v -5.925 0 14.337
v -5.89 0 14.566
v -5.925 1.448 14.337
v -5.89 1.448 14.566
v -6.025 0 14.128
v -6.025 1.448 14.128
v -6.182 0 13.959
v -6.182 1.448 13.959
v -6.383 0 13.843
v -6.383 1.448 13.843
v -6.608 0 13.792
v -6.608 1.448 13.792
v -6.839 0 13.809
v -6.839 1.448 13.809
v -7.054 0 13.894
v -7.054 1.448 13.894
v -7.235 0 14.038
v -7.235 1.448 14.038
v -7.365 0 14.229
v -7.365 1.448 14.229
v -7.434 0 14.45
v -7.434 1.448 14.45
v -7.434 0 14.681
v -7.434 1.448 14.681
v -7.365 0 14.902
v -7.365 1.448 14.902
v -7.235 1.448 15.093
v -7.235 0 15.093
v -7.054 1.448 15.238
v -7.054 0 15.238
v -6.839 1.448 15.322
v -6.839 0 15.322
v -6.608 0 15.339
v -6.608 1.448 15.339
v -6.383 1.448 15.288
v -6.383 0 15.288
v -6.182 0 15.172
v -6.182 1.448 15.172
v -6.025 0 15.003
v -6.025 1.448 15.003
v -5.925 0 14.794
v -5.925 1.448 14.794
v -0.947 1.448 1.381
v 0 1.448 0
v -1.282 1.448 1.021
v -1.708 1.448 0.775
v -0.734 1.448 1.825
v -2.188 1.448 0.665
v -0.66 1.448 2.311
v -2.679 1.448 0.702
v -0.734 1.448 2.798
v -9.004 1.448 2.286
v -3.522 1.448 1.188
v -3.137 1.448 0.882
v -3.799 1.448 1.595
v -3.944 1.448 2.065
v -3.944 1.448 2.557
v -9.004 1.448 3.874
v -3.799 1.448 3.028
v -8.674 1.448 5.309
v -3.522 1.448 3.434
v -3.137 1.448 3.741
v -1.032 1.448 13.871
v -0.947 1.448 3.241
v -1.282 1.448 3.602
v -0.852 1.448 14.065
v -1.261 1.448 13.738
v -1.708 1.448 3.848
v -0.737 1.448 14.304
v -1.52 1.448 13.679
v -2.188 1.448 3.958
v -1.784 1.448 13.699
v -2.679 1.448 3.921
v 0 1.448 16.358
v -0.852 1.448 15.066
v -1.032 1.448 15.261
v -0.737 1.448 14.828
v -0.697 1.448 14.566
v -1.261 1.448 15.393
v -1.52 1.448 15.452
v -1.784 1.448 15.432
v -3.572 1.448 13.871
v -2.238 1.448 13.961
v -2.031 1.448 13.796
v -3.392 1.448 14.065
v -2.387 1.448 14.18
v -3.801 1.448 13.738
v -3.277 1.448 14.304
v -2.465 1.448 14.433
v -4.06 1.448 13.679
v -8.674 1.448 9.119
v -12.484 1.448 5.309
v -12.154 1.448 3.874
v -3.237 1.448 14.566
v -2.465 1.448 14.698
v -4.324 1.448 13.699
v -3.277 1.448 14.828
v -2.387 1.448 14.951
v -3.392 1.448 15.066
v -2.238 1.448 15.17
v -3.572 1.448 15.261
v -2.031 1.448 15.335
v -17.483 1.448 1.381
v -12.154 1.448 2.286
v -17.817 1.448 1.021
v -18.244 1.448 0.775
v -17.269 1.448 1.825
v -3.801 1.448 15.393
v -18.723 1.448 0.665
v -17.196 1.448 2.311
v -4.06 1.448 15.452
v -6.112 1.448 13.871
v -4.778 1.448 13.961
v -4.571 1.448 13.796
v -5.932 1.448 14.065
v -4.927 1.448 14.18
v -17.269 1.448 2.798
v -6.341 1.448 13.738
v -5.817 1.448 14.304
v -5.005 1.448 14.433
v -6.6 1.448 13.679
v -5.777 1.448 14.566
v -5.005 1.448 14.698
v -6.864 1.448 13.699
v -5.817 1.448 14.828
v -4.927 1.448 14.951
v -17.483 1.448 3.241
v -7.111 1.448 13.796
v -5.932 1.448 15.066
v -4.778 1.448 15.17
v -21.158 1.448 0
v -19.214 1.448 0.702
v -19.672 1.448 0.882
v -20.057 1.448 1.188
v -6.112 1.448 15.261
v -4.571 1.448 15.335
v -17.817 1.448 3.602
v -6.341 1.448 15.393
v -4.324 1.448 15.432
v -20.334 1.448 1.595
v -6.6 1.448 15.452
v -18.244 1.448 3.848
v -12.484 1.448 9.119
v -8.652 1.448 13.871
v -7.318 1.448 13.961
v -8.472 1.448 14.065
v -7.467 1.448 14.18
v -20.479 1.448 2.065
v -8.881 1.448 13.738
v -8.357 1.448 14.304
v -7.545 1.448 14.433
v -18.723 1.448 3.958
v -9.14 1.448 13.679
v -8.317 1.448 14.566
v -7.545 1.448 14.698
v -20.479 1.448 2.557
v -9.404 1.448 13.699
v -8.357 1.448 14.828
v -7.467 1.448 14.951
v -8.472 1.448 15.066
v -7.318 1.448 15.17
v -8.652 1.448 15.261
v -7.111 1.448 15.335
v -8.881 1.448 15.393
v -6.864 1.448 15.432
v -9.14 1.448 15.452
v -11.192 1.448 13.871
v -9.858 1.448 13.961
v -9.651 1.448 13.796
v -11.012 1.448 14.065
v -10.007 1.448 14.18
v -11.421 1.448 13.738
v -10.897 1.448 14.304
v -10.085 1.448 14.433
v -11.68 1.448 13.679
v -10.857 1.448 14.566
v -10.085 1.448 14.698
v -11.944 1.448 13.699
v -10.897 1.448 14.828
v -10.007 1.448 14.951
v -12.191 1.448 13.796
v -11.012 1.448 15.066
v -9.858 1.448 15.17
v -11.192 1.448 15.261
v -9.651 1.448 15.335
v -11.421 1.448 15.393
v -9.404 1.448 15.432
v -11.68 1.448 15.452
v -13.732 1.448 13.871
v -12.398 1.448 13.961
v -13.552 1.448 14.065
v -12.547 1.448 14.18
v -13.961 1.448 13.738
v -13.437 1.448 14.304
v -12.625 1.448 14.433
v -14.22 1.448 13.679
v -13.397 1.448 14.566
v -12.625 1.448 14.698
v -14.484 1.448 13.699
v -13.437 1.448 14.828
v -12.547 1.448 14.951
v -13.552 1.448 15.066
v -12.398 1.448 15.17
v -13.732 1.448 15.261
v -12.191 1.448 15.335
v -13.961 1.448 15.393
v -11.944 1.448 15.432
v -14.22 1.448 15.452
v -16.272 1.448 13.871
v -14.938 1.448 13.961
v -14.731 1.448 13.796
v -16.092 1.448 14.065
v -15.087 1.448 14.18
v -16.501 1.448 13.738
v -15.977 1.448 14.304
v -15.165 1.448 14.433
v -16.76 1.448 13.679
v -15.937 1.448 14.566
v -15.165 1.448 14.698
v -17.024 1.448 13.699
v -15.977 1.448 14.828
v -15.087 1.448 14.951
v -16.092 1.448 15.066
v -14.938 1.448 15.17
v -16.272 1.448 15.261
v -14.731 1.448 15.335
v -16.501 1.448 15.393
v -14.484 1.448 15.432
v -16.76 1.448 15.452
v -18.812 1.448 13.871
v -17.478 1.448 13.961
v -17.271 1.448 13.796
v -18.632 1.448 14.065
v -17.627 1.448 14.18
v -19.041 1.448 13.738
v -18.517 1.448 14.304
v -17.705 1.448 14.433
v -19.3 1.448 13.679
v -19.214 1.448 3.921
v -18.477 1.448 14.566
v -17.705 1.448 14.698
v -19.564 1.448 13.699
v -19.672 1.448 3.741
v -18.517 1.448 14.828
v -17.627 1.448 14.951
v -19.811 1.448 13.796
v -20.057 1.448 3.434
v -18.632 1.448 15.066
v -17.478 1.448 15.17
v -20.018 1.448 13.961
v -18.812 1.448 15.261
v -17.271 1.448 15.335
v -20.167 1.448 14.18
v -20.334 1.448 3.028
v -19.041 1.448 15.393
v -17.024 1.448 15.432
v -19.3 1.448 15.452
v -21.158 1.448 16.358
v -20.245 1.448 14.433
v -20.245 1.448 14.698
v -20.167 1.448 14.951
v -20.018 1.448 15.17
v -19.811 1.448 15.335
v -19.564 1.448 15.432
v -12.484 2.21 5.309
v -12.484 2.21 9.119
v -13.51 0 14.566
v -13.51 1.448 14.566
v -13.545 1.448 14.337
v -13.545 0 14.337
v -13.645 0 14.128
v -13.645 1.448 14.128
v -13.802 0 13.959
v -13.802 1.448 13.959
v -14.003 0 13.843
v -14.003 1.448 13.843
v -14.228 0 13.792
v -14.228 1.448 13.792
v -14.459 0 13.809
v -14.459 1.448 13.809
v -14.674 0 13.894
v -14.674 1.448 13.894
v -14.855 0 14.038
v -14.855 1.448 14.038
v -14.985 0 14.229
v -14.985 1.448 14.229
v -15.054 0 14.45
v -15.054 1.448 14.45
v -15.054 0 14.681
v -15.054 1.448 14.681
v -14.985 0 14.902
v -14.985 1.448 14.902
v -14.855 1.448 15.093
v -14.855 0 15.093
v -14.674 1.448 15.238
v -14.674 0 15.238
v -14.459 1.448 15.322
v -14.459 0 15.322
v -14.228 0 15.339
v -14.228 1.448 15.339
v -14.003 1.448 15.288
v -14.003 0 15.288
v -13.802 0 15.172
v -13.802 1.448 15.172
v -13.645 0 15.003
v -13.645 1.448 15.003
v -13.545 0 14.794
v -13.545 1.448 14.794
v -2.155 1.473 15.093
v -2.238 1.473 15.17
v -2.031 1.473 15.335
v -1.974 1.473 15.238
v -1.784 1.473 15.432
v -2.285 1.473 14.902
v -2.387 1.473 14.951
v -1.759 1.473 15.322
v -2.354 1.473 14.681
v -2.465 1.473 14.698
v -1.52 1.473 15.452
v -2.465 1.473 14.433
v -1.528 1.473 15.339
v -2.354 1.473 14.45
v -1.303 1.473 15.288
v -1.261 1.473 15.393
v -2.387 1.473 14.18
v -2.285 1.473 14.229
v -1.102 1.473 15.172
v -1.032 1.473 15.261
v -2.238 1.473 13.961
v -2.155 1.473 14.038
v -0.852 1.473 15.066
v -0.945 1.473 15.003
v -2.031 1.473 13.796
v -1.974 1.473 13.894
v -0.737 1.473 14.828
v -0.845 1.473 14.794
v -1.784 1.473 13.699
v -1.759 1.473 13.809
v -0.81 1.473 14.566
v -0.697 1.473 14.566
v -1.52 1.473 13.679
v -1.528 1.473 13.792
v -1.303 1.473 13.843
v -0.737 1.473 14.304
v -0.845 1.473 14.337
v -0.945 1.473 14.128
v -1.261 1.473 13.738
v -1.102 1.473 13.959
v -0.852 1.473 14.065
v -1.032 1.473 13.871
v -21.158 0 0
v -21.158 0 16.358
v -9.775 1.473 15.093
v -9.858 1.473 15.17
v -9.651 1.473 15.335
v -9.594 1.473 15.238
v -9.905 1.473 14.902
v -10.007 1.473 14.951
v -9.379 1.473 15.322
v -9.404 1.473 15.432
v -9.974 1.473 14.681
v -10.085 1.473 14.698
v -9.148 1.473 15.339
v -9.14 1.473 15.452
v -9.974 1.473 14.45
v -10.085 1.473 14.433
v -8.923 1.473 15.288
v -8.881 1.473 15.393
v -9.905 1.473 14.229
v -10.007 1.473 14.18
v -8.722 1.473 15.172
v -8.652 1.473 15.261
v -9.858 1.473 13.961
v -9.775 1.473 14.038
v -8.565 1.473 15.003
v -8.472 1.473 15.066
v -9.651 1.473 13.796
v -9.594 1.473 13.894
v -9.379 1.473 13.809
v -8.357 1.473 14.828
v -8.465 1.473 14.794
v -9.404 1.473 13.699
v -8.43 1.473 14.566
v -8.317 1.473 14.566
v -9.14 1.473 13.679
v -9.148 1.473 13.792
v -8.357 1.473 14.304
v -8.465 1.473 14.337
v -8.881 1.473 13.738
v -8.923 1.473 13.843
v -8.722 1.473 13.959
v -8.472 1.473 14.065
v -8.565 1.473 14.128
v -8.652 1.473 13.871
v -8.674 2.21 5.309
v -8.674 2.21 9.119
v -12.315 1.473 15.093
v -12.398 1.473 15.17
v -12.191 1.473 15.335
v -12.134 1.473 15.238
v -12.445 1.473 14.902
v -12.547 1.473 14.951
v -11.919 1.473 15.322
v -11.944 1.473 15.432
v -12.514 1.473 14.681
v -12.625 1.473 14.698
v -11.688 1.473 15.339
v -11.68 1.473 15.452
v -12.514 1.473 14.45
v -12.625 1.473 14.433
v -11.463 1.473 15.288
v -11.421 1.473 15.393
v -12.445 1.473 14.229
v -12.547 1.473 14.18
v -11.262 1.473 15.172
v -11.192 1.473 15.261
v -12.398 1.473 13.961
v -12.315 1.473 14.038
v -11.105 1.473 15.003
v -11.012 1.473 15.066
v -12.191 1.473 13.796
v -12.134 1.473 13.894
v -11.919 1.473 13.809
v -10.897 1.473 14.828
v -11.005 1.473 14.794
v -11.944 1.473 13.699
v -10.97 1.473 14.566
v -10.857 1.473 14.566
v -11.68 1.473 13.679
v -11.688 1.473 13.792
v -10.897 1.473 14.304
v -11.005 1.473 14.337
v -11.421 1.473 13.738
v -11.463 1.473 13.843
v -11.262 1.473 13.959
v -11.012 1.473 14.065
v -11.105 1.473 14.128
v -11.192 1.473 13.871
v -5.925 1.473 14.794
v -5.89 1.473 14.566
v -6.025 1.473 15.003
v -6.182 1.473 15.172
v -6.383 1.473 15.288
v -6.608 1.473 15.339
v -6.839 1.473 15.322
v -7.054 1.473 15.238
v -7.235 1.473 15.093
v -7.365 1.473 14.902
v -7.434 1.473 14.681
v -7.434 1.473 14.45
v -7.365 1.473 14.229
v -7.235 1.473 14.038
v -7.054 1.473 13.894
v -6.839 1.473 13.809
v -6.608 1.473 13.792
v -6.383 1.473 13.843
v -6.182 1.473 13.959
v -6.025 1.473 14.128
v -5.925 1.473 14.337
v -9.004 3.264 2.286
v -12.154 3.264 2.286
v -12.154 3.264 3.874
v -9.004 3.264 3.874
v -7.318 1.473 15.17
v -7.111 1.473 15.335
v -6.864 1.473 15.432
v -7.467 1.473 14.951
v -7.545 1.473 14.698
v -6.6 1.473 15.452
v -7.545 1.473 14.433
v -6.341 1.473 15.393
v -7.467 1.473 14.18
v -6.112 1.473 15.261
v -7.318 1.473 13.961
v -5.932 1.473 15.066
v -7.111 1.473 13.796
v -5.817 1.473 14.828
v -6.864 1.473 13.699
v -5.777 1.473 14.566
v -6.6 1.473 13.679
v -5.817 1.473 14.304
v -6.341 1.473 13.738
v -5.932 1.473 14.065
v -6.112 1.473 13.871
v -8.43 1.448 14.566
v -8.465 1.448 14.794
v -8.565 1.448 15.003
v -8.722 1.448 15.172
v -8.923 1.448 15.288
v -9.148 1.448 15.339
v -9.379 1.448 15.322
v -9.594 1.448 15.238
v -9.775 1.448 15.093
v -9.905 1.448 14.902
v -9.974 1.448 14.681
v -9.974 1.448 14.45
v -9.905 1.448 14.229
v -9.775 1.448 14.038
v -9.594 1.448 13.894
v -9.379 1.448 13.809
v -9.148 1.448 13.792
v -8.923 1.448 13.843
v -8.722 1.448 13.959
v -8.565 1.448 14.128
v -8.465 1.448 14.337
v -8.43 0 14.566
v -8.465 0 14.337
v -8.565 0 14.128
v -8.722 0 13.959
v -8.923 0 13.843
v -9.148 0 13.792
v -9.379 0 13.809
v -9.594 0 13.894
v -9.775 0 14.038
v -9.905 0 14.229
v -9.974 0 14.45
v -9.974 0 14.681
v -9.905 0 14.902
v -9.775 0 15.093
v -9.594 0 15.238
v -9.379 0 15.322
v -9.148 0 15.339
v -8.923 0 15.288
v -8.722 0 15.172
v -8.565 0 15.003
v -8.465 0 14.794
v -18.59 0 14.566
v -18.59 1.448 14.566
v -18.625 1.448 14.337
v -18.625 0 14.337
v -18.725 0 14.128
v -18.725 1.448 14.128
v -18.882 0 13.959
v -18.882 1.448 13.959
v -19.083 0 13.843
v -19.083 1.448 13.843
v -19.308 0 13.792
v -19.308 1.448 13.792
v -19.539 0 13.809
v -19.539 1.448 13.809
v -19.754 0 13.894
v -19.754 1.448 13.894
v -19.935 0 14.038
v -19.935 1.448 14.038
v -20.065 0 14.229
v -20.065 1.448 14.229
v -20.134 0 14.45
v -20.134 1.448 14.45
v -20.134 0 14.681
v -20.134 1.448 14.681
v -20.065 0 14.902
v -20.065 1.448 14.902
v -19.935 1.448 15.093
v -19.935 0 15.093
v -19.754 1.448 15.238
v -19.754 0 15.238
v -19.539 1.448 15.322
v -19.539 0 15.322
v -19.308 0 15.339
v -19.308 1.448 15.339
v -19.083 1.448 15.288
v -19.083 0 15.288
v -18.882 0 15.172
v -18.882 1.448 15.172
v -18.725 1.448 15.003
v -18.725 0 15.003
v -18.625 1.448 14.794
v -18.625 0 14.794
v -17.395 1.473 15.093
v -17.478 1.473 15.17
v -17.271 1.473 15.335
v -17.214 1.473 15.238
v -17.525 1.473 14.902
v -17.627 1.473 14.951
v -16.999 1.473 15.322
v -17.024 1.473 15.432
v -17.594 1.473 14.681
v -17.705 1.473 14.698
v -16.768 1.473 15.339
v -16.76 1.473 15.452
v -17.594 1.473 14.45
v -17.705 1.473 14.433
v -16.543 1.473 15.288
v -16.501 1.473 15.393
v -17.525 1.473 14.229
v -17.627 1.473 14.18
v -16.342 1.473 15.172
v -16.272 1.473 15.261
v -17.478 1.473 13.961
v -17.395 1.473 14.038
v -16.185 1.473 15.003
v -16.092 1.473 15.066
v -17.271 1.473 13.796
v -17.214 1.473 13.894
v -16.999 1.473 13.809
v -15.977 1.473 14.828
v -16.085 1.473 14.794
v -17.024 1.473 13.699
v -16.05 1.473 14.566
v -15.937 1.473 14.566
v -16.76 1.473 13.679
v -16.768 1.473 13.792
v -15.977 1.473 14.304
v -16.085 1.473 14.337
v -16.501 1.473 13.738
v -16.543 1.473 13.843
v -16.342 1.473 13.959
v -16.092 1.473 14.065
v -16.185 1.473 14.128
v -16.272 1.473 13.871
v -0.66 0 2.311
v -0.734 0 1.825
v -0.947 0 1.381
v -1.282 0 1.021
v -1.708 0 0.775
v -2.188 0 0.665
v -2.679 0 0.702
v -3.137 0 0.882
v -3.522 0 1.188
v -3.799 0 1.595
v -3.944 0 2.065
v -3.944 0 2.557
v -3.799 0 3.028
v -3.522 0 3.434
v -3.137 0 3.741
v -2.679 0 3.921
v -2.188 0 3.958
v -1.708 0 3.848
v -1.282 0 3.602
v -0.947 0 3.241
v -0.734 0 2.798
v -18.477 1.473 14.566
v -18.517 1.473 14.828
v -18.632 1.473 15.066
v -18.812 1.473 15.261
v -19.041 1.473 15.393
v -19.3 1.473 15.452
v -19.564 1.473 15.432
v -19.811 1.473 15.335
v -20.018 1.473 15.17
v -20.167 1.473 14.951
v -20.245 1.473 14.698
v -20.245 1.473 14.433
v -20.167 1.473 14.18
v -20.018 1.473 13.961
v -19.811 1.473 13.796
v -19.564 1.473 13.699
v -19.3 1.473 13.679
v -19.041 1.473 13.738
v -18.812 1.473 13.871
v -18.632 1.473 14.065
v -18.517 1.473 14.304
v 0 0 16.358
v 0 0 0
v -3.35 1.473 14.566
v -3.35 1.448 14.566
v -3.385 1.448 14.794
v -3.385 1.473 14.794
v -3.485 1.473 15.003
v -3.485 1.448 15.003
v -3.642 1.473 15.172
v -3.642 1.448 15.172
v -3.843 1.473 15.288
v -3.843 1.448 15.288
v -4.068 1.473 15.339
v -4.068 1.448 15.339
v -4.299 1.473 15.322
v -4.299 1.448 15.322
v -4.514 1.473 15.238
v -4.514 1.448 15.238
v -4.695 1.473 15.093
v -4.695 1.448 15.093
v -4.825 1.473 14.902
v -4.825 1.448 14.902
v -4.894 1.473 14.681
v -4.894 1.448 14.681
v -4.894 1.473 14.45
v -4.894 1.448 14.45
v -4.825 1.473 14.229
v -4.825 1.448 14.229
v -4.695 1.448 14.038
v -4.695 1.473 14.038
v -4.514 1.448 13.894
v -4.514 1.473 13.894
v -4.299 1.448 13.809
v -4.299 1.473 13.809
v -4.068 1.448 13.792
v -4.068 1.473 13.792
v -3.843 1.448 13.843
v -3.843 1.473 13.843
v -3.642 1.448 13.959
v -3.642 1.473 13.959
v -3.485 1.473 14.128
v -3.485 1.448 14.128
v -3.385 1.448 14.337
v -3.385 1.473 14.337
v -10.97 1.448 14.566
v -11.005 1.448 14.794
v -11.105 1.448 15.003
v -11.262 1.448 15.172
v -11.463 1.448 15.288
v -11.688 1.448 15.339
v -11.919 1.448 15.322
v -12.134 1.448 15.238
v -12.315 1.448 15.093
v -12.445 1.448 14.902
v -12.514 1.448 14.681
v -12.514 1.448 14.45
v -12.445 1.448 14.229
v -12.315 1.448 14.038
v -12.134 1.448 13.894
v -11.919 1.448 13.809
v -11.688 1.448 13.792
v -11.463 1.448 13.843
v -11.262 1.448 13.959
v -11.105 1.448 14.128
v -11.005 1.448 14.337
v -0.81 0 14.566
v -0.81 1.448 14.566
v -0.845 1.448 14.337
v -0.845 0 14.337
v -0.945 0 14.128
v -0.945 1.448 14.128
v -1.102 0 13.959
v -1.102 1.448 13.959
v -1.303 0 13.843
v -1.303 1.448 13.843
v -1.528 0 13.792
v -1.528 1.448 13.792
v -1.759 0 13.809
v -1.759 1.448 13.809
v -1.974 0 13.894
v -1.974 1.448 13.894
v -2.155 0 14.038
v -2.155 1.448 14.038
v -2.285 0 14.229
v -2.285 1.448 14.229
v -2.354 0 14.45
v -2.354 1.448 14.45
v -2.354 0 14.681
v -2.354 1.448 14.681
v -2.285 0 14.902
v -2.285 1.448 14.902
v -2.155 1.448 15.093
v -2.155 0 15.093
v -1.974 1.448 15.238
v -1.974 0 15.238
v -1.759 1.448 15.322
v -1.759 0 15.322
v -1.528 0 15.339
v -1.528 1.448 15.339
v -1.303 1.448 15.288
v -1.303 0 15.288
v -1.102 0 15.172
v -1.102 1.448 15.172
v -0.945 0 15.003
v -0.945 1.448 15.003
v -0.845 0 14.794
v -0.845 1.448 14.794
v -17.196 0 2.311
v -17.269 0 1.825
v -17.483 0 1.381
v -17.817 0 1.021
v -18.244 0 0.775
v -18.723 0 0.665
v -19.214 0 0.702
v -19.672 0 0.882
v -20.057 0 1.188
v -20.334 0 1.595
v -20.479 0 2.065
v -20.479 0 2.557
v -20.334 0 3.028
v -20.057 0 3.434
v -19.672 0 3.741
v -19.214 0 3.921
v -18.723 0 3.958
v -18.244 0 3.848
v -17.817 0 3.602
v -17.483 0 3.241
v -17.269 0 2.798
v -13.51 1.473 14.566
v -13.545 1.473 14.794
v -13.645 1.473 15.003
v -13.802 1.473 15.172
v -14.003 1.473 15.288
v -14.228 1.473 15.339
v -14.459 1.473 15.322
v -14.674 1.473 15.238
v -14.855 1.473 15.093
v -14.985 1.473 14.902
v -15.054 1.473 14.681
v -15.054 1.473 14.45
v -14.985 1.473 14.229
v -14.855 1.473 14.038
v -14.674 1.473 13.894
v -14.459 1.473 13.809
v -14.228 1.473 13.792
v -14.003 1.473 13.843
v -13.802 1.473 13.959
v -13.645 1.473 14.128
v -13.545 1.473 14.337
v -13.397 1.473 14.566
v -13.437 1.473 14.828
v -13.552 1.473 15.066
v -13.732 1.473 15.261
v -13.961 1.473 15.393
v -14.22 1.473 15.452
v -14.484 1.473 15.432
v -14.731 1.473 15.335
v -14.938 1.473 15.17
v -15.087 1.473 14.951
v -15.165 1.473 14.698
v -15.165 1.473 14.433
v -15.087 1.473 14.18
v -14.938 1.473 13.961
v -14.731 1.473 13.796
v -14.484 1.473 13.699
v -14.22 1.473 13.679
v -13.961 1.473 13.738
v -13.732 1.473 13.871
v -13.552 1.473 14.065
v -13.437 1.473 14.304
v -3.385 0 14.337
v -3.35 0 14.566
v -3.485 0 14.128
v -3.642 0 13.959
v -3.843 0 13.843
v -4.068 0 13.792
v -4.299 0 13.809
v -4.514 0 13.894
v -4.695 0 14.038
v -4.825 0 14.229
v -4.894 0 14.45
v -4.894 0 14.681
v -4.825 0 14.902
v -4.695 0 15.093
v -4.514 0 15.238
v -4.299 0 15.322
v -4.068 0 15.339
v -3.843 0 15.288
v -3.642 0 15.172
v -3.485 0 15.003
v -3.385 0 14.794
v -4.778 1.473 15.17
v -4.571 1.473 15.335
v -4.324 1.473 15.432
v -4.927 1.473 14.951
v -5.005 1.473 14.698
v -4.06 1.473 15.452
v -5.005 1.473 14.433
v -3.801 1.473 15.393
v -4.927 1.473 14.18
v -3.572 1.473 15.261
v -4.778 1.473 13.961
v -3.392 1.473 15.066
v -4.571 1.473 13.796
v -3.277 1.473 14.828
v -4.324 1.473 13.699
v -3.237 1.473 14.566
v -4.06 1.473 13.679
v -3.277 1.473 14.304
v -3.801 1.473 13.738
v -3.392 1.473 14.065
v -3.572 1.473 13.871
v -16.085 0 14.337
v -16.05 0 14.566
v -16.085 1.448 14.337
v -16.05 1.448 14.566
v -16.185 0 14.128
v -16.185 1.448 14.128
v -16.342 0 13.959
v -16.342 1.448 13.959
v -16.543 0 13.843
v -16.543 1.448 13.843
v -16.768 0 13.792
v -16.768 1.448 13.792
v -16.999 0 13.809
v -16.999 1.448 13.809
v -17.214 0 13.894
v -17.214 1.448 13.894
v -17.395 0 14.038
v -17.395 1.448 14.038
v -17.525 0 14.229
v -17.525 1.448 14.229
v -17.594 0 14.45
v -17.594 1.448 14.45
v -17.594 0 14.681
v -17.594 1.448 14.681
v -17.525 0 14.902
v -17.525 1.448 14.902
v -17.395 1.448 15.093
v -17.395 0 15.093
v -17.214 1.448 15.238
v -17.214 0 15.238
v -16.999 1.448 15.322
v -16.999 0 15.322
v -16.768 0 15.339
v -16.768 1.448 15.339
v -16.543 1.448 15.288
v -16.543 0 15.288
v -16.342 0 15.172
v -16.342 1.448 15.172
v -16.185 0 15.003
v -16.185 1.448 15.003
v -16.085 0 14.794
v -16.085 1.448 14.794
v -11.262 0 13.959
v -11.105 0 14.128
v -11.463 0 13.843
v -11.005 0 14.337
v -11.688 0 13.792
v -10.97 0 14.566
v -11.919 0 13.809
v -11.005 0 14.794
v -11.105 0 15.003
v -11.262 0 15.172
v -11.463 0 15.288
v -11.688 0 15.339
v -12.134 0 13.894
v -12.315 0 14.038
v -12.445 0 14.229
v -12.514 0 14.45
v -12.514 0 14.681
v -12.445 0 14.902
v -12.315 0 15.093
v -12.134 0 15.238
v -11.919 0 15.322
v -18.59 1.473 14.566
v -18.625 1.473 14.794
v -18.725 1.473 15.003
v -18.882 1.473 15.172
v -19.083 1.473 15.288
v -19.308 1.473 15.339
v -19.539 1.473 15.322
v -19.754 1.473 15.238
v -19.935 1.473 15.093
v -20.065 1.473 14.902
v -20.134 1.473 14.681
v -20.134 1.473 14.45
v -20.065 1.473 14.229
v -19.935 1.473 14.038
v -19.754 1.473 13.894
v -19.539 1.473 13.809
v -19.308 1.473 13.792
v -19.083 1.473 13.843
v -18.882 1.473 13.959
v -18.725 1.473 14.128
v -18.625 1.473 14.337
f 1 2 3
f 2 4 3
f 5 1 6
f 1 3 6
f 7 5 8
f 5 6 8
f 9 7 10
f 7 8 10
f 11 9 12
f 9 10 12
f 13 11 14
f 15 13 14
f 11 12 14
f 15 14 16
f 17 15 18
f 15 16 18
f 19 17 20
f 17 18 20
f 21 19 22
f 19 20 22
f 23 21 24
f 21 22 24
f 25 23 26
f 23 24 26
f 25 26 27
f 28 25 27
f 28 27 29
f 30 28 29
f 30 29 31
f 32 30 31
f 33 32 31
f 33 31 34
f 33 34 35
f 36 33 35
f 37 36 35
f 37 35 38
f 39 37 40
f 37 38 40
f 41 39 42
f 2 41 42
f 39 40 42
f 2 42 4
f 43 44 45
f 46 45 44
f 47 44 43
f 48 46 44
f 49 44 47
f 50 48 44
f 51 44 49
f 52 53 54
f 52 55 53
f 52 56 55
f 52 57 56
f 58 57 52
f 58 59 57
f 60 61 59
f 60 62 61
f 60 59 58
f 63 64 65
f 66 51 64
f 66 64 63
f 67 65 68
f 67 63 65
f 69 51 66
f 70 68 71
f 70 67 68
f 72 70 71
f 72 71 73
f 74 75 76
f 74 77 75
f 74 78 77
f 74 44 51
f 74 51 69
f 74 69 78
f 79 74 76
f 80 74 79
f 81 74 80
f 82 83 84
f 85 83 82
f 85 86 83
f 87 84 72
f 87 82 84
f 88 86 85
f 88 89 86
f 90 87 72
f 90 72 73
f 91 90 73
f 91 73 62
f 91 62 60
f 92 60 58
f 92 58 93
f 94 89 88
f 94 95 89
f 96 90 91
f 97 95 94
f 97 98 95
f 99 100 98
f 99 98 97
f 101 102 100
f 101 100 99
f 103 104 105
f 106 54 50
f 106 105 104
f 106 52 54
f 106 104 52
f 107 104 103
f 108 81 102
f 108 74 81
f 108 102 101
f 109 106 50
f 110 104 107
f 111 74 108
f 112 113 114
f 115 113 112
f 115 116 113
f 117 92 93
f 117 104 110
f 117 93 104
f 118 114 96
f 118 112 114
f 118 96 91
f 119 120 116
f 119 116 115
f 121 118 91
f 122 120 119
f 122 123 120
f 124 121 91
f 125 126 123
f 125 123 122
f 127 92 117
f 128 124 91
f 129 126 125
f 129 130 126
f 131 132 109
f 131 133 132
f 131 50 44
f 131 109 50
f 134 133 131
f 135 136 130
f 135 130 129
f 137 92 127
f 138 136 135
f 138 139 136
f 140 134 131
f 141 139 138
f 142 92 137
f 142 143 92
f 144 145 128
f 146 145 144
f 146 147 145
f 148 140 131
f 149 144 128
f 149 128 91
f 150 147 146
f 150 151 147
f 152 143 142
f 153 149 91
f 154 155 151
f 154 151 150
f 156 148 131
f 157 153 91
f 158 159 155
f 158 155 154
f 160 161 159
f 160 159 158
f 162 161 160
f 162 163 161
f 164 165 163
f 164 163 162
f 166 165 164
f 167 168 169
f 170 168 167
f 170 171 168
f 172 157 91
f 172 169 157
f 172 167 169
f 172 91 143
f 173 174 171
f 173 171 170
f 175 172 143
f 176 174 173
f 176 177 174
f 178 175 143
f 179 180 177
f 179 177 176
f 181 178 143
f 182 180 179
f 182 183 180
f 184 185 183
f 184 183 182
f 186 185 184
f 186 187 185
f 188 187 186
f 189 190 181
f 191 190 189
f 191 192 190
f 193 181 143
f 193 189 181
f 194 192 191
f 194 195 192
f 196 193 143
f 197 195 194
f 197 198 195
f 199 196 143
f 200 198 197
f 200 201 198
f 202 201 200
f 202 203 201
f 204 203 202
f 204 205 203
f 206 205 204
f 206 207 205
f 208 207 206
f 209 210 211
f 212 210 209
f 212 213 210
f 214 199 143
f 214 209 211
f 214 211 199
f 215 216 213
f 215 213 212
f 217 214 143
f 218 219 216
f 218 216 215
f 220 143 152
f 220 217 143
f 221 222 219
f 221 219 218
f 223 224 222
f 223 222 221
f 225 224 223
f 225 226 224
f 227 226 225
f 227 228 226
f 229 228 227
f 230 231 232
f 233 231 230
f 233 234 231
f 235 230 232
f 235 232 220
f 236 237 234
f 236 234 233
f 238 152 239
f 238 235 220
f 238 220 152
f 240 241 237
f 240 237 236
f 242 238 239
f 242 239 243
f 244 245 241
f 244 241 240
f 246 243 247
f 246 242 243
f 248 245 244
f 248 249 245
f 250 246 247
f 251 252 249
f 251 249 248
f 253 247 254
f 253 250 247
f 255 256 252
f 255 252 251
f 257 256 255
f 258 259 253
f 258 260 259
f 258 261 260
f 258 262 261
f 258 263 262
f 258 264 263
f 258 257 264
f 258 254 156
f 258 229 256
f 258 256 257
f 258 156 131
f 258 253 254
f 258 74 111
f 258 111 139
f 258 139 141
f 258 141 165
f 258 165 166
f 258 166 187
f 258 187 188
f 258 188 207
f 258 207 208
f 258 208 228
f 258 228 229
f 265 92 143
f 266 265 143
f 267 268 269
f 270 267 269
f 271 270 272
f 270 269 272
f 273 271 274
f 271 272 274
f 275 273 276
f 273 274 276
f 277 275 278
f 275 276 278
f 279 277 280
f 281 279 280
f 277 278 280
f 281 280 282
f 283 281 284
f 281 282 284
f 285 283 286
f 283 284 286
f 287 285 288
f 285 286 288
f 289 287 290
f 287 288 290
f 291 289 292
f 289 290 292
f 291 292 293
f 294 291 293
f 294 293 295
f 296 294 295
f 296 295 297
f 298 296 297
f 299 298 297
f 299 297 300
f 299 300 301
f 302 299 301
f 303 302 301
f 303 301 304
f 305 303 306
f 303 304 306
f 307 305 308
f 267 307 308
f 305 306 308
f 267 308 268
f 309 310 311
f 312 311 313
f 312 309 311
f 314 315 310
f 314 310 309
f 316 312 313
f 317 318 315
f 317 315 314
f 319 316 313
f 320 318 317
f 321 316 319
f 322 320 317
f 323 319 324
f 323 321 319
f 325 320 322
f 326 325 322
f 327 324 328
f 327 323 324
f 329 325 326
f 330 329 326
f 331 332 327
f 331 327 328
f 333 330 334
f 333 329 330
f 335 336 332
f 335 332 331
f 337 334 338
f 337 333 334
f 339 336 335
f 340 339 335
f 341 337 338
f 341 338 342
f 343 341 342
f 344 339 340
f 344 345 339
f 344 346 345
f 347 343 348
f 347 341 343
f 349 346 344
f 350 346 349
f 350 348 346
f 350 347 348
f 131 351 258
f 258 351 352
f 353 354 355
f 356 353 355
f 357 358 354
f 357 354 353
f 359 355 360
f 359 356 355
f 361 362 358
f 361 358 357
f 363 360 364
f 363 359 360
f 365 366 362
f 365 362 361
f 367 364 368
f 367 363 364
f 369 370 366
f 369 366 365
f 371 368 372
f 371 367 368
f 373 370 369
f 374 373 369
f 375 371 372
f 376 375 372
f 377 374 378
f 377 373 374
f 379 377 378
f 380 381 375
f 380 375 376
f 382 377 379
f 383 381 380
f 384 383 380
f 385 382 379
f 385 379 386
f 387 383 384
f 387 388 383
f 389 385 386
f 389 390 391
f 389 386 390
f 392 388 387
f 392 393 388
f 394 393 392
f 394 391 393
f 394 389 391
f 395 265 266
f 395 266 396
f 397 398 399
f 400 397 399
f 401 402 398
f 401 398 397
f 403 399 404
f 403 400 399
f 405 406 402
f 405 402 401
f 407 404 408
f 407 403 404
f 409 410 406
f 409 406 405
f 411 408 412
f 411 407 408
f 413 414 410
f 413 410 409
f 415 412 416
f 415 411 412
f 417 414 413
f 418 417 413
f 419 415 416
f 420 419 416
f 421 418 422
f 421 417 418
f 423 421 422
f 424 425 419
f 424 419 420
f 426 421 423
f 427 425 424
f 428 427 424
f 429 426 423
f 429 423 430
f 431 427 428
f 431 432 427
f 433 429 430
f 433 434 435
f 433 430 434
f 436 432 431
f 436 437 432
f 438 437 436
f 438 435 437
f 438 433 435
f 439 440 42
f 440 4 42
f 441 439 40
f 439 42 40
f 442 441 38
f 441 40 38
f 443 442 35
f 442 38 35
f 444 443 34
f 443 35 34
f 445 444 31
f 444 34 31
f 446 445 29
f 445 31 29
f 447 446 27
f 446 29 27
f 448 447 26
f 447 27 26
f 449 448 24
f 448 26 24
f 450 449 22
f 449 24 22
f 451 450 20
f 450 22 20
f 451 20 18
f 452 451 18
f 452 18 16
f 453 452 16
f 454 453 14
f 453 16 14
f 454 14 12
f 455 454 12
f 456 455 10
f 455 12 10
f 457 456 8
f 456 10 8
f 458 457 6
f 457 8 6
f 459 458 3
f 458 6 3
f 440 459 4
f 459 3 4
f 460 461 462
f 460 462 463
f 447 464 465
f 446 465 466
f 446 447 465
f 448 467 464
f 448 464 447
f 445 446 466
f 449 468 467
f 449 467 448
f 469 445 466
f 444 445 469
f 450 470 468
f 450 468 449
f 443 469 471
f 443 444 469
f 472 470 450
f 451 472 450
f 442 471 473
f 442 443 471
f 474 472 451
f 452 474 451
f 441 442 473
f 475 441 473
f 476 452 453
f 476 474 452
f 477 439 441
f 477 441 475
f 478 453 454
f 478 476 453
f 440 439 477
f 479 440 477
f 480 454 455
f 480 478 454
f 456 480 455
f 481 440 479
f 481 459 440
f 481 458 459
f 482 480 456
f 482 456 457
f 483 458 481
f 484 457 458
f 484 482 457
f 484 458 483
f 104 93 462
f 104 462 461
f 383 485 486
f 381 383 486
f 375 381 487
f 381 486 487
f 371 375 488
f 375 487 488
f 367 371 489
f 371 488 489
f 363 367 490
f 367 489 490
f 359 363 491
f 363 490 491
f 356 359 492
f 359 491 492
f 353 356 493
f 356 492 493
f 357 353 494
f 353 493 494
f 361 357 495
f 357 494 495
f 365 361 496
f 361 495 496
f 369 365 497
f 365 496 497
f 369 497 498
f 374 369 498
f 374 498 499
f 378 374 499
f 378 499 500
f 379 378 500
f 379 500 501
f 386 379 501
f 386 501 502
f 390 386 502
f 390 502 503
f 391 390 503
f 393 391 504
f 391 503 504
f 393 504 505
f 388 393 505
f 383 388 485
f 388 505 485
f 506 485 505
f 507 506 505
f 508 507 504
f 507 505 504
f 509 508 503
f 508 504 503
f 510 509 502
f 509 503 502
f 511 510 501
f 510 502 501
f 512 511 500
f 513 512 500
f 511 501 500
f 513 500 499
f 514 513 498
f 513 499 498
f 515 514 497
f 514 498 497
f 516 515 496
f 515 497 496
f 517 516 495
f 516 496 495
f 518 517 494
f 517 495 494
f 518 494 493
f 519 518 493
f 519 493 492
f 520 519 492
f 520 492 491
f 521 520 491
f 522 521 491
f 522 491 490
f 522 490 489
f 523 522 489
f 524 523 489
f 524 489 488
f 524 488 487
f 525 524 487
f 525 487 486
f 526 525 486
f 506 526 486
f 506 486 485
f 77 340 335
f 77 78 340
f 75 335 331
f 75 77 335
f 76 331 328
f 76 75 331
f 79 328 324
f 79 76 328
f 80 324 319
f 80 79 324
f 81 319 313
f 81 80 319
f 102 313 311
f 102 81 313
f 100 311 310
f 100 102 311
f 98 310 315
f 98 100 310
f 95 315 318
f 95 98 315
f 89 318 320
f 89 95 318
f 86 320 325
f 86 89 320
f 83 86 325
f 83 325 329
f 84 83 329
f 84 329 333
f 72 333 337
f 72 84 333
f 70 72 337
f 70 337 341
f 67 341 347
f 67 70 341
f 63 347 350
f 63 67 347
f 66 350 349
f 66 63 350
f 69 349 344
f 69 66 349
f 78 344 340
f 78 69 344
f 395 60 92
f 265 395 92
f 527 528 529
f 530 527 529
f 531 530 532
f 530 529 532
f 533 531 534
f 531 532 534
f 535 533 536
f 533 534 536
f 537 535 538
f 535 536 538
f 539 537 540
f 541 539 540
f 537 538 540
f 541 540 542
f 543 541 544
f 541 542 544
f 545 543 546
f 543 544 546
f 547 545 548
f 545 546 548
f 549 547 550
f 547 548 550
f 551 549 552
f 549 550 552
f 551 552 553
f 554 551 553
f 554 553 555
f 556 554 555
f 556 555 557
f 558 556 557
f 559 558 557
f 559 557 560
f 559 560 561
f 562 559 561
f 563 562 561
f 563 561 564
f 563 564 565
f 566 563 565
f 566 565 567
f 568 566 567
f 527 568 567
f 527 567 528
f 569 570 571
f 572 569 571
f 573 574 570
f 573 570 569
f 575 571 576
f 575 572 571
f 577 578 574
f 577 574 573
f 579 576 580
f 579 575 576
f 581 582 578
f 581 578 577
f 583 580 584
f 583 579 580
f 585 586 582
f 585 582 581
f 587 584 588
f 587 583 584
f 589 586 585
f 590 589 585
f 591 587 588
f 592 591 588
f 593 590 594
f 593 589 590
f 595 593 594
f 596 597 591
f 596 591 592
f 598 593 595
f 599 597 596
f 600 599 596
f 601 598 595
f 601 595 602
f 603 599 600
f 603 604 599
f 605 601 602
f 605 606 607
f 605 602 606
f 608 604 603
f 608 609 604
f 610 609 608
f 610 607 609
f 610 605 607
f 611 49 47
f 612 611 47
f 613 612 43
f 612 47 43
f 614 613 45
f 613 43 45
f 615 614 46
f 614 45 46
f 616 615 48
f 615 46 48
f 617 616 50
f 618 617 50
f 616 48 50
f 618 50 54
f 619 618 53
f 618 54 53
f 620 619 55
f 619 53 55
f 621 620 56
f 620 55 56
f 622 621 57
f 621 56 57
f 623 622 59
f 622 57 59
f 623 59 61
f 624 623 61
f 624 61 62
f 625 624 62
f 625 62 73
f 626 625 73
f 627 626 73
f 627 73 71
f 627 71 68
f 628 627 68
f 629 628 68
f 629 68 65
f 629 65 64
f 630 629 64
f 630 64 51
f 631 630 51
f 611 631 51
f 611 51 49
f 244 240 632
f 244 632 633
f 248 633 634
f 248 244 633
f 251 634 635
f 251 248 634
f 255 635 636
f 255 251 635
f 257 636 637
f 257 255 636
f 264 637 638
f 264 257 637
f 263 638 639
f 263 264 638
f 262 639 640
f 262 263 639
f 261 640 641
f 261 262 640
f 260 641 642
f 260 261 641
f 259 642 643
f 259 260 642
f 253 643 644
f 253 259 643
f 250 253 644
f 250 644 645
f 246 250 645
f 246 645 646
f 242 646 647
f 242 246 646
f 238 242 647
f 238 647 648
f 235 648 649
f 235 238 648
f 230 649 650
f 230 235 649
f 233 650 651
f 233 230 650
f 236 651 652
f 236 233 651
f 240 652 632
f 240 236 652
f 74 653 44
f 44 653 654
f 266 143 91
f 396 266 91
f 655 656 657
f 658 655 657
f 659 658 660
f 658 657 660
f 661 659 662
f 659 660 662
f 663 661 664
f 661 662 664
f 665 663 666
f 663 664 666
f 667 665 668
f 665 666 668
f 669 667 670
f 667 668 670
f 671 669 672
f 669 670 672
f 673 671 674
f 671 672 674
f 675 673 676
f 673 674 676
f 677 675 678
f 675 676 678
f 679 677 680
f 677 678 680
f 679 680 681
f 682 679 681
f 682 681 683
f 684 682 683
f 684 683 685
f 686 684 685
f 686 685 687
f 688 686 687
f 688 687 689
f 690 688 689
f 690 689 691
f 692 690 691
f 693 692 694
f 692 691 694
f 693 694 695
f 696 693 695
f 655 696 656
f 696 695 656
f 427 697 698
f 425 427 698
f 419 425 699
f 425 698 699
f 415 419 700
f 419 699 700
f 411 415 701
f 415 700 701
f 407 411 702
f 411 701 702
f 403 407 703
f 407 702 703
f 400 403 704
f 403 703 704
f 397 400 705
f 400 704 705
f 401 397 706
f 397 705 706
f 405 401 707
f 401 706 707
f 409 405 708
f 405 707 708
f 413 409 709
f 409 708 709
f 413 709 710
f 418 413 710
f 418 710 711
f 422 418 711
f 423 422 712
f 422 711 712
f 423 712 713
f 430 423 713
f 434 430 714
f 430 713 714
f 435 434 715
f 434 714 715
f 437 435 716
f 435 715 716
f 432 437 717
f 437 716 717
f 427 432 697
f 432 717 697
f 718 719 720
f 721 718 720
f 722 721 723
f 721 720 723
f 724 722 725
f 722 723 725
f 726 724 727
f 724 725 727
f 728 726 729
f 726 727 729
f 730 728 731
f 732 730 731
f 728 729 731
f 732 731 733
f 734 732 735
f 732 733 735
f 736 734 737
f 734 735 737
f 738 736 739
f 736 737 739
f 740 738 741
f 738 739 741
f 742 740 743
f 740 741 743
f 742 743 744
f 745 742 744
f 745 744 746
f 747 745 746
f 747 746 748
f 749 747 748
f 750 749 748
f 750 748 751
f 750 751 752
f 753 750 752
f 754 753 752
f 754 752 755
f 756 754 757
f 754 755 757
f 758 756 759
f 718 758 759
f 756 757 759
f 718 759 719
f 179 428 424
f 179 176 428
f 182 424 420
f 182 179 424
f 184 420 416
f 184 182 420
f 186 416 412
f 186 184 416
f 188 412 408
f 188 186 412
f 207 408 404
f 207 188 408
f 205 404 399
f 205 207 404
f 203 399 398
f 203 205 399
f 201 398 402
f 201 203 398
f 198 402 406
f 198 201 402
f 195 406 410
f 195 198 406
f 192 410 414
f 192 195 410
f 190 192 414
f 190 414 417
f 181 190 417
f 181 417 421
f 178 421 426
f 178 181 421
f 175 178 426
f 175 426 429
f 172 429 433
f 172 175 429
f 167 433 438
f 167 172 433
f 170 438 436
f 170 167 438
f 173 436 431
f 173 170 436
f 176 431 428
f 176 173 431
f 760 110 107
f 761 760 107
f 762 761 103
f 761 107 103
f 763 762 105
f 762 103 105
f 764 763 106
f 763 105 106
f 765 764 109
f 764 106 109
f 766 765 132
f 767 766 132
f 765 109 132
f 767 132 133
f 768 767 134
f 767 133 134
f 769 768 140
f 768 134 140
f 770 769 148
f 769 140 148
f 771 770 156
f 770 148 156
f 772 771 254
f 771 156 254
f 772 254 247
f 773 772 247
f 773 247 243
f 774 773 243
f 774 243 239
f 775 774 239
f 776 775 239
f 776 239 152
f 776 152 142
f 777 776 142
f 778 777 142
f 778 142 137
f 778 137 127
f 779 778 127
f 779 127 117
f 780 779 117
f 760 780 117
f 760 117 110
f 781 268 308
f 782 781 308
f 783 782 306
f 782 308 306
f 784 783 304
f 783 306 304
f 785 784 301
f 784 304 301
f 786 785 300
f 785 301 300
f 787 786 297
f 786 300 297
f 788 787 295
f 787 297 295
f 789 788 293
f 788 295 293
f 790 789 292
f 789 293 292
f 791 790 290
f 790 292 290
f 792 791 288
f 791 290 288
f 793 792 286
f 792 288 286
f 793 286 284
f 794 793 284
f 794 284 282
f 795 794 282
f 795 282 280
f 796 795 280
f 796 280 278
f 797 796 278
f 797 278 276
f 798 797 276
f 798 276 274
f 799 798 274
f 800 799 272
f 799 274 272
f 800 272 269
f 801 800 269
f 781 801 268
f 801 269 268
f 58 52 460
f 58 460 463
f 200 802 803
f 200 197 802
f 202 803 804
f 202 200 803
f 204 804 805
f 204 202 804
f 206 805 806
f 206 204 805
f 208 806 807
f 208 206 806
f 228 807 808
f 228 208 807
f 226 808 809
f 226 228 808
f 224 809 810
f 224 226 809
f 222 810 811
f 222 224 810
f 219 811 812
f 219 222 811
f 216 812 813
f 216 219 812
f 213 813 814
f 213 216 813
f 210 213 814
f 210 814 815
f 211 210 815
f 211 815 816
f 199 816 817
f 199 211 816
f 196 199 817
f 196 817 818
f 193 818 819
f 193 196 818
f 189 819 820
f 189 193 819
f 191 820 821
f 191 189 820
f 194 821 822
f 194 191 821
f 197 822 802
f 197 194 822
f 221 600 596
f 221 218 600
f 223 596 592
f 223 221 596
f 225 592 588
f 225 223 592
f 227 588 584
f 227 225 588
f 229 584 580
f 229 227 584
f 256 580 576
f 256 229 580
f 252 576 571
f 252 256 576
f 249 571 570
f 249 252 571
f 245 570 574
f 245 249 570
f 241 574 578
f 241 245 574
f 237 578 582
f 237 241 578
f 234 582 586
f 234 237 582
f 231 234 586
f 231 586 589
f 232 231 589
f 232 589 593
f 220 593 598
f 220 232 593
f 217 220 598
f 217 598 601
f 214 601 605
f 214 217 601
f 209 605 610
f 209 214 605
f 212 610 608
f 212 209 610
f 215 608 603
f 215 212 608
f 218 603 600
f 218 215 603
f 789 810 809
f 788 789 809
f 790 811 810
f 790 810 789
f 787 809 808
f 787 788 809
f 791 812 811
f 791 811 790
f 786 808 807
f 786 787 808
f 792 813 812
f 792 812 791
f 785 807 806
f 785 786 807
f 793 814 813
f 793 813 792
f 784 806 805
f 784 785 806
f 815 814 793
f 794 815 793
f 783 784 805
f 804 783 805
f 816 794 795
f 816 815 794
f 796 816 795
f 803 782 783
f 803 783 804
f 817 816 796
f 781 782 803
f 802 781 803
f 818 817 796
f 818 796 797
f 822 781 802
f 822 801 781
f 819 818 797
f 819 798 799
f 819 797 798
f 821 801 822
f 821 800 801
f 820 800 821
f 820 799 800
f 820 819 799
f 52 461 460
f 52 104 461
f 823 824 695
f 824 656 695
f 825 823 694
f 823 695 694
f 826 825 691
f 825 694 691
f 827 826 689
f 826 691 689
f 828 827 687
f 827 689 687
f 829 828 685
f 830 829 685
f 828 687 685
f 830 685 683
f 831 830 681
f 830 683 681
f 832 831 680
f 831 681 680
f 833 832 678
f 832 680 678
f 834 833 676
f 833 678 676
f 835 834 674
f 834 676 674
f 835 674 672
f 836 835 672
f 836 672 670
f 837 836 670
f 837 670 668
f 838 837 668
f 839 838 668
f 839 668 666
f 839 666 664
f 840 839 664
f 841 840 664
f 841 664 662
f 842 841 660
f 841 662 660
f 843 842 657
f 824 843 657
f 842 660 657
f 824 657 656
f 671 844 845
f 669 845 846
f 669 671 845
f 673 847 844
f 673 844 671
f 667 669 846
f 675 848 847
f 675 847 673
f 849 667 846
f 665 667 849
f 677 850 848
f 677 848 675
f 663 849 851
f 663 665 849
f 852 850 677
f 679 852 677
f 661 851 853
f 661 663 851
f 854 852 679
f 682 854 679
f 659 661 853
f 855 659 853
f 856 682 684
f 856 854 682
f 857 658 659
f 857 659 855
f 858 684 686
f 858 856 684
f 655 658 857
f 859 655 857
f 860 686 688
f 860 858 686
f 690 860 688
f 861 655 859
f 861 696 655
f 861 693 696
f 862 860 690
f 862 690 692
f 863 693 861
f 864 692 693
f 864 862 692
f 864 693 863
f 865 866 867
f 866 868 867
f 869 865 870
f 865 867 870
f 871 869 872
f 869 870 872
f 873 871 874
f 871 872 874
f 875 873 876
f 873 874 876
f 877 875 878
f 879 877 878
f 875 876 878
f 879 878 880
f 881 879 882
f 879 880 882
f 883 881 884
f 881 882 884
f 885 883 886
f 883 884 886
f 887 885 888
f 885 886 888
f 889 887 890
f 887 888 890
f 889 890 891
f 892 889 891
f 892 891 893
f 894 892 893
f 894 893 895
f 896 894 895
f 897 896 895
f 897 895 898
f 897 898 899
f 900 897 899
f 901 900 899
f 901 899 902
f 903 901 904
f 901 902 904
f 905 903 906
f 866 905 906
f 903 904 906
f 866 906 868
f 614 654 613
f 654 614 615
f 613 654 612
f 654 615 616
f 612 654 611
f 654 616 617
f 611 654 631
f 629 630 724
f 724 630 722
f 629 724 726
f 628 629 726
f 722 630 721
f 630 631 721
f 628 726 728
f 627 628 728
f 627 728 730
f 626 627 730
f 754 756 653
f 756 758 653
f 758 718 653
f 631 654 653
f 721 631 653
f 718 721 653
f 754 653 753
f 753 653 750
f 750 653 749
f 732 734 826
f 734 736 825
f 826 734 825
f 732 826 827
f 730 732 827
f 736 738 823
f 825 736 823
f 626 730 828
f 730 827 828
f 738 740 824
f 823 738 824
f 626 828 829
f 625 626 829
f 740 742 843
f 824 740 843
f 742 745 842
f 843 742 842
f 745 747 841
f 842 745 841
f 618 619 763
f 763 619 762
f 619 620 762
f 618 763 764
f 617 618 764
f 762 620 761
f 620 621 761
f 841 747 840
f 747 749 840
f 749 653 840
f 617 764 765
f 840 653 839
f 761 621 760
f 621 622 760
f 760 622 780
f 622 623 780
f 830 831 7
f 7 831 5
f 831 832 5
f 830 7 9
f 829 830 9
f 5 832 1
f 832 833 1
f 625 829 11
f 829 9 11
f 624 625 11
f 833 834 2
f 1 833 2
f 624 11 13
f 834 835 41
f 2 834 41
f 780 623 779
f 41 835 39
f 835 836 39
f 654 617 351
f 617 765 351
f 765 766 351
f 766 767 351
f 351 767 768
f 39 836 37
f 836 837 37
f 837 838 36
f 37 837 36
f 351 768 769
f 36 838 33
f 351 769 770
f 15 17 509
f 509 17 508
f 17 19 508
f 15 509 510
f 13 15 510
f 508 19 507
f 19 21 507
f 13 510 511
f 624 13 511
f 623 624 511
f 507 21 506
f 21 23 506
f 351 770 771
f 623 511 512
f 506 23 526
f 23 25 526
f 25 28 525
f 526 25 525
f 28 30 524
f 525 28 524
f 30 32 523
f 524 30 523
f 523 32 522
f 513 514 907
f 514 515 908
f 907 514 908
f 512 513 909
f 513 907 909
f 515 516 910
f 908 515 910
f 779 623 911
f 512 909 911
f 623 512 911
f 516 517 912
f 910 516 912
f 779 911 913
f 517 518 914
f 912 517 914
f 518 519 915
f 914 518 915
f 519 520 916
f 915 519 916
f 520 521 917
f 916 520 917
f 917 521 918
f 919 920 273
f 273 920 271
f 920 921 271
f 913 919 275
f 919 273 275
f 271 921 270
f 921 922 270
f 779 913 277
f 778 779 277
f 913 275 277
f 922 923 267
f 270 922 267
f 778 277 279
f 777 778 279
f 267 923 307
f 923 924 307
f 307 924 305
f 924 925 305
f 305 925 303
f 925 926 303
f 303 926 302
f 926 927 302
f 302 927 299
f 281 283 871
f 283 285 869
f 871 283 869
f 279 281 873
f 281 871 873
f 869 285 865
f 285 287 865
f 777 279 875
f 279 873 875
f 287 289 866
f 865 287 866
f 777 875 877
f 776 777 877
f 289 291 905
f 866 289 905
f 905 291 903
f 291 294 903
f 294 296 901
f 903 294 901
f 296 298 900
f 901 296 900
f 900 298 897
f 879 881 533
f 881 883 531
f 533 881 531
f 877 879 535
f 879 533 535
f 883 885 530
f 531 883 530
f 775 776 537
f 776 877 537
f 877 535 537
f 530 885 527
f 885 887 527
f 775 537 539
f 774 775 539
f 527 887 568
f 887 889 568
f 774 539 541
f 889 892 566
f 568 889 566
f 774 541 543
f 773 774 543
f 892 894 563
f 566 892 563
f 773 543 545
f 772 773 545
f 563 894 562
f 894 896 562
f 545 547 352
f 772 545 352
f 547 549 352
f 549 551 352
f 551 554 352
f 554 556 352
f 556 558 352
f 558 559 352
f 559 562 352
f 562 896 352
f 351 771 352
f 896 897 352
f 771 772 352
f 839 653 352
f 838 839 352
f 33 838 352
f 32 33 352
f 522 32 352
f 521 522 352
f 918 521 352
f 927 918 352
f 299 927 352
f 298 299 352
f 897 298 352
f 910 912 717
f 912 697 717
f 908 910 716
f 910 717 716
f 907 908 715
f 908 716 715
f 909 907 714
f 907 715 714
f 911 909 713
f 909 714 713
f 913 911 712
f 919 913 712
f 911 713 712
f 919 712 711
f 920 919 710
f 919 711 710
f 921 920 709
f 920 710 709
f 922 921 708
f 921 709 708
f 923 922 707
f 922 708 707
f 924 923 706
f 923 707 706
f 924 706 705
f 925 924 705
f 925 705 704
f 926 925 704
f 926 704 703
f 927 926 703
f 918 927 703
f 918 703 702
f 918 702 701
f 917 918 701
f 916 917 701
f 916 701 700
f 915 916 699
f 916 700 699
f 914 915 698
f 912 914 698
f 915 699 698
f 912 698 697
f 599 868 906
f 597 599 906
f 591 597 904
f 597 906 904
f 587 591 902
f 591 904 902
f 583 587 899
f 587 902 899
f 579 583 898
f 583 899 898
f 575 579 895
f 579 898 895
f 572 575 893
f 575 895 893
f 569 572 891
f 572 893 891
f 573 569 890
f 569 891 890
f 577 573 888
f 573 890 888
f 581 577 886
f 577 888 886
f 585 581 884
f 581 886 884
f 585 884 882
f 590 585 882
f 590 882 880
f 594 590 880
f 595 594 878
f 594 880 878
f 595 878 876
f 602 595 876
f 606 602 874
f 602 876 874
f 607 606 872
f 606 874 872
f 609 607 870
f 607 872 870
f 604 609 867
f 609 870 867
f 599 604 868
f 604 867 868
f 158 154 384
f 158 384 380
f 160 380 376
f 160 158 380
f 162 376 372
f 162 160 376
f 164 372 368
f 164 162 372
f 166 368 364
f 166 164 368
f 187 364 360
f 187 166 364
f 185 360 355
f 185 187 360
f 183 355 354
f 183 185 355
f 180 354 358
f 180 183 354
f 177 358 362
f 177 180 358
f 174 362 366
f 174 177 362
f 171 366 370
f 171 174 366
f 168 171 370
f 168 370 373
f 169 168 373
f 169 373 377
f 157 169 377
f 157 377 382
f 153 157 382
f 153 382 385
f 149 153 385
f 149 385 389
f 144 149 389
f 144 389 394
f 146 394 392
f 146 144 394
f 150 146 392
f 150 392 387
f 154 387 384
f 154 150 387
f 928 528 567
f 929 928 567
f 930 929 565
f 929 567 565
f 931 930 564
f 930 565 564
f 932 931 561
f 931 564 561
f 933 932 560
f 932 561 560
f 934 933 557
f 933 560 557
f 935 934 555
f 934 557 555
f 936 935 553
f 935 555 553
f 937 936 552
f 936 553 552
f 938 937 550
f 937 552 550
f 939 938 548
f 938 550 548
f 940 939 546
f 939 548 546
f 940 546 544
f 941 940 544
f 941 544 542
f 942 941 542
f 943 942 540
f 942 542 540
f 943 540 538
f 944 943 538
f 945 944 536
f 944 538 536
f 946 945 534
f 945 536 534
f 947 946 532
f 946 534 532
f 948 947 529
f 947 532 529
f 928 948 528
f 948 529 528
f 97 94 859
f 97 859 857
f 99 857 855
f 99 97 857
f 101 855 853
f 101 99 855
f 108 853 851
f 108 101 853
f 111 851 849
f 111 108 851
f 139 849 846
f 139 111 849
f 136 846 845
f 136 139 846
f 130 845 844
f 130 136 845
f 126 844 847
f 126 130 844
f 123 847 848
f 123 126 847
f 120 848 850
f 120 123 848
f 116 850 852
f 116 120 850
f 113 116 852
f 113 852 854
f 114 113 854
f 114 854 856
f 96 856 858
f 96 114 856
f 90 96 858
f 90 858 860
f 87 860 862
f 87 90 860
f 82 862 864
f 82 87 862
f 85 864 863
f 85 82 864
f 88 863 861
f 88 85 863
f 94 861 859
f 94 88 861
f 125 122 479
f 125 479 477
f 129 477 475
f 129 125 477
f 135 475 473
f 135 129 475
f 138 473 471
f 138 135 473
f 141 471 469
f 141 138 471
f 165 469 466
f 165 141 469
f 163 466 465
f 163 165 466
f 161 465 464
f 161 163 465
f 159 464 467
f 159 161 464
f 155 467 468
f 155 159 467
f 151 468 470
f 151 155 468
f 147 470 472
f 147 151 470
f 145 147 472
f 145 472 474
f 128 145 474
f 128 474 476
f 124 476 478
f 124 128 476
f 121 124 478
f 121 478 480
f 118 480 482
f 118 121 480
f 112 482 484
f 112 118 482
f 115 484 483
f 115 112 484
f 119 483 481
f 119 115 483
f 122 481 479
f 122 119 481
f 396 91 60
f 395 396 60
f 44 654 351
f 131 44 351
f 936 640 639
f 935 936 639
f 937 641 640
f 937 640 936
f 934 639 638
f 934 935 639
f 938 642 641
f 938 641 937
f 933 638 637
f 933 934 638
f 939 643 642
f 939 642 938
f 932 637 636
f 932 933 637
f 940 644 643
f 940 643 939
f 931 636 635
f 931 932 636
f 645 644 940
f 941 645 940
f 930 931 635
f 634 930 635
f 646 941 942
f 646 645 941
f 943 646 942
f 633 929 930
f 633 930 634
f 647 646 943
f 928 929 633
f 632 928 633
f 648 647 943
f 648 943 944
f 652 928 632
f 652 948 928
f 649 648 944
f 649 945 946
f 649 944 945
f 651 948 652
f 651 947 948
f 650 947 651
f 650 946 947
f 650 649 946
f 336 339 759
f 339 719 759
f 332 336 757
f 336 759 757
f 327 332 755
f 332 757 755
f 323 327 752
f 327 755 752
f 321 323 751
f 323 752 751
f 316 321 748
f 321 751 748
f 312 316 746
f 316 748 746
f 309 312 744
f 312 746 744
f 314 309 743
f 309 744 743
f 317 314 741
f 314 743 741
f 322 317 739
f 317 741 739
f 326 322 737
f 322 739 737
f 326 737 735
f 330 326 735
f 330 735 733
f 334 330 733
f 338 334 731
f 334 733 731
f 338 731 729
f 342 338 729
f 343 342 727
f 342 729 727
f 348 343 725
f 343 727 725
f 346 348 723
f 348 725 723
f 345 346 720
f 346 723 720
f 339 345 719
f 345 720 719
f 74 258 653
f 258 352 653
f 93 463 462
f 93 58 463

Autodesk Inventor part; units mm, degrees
ref_plane "YZ Plane" through (0, 0, 0) normal (1, 0, 0) x (0, 1, 0)
ref_plane "XZ Plane" through (0, 0, 0) normal (0, 1, 0) x (-1, 0, 0)
ref_plane "XY Plane" through (0, 0, 0) normal (0, 0, 1) x (1, 0, 0)
sketch "Sketch1" plane through (0, 0, 0) normal (0, 1, 0) x (-1, 0, 0)
  line L0 (0, 0) -> (21.1582, 0)
  line L1 (21.1582, 0) -> (21.1582, 16.3576)
  line L2 (21.1582, 16.3576) -> (0, 16.3576)
  line L3 (0, 16.3576) -> (0, 0)
  dimension "d0" = 21.1582
  dimension "d1" = 16.3576
extrude "Extrusion1" add sketch "Sketch1" along normal blind 1.4478
sketch "Sketch2" plane through (0, 1.4478, 0) normal (0, 1, 0) x (1, 0, 0)
  line L0 (0, 0) -> (-21.1582, 0) projected
  line L1 (-21.1582, 0) -> (-21.1582, -16.3576) projected
  line L2 (0, -16.3576) -> (0, 0) projected
  circle A0 centre (-18.8468, -2.3114) radius 1.651
  circle A1 centre (-2.3114, -2.3114) radius 1.651
  dimension "d4" = 0.6604
  dimension "d5" = 0.6604
  dimension "d6" = 0.6604
  dimension "d7" = 3.302
extrude "Extrusion2" cut sketch "Sketch2" against normal through all
sketch "Sketch3" plane through (0, 1.4478, 0) normal (0, 1, 0) x (1, 0, 0)
  line L0 (0, 0) -> (-21.1582, 0) projected
  line L1 (-12.1539, -2.286) -> (-9.0043, -2.286)
  line L2 (-9.0043, -2.286) -> (-9.0043, -3.8735)
  line L3 (-9.0043, -3.8735) -> (-12.1539, -3.8735)
  line L4 (-12.1539, -3.8735) -> (-12.1539, -2.286)
  point P0 (-10.5791, -2.286)
  point P1 (-10.5791, 0)
  dimension "d10" = 3.1496
  dimension "d11" = 1.5875
  dimension "d12" = 2.286
extrude "Extrusion3" add sketch "Sketch3" along normal blind 1.8161
sketch "Sketch4" plane through (0, 1.4478, 0) normal (0, 1, 0) x (1, 0, 0)
  line L0 (-9.0043, -3.8735) -> (-12.1539, -3.8735) projected
  line L1 (0, 0) -> (-21.1582, 0) projected
  line L2 (-8.6741, -5.3086) -> (-12.4841, -5.3086)
  line L3 (-12.4841, -5.3086) -> (-12.4841, -9.1186)
  line L4 (-12.4841, -9.1186) -> (-8.6741, -9.1186)
  line L5 (-8.6741, -9.1186) -> (-8.6741, -5.3086)
  line L6 (-8.6741, -5.3086) -> (-12.4841, -9.1186) construction
  line L7 (-12.4841, -5.3086) -> (-8.6741, -9.1186) construction
  point P0 (-10.5791, -7.2136)
  point P1 (-10.5791, 0)
  point P2 (-10.5791, -7.2136)
  dimension "d15" = 3.81
  dimension "d16" = 3.81
  dimension "d17" = 1.4351
extrude "Extrusion4" add sketch "Sketch4" along normal blind 0.762
sketch "Sketch5" plane through (0, 1.4478, 0) normal (0, 1, 0) x (1, 0, 0)
  line L0 (-21.1582, 0) -> (-21.1582, -16.3576) projected
  line L1 (-21.1582, -16.3576) -> (0, -16.3576) projected
  circle A0 centre (-19.3662, -14.5656) radius 0.776
  dimension "d20" = 1.016
  dimension "d21" = 1.016
extrude "Extrusion5" cut sketch "Sketch5" against normal through all
sketch "Sketch6" plane through (0, 1.4478, 0) normal (0, 1, 0) x (1, 0, 0)
  circle A0 centre (-19.3662, -14.5656) radius 0.776 projected
  circle A1 centre (-19.3662, -14.5656) radius 0.889
  dimension "d24" = 1.778
extrude "Extrusion6" add sketch "Sketch6" along normal blind 0.0254
pattern_linear "Rectangular Pattern1" count 8 spacing 2.54 along (1, 0, 0) of "Extrusion5", "Extrusion6"
equation "\"d5\" = d4"
equation "\"d6\" = d5"
properties part number "GY-521 Gyro"
